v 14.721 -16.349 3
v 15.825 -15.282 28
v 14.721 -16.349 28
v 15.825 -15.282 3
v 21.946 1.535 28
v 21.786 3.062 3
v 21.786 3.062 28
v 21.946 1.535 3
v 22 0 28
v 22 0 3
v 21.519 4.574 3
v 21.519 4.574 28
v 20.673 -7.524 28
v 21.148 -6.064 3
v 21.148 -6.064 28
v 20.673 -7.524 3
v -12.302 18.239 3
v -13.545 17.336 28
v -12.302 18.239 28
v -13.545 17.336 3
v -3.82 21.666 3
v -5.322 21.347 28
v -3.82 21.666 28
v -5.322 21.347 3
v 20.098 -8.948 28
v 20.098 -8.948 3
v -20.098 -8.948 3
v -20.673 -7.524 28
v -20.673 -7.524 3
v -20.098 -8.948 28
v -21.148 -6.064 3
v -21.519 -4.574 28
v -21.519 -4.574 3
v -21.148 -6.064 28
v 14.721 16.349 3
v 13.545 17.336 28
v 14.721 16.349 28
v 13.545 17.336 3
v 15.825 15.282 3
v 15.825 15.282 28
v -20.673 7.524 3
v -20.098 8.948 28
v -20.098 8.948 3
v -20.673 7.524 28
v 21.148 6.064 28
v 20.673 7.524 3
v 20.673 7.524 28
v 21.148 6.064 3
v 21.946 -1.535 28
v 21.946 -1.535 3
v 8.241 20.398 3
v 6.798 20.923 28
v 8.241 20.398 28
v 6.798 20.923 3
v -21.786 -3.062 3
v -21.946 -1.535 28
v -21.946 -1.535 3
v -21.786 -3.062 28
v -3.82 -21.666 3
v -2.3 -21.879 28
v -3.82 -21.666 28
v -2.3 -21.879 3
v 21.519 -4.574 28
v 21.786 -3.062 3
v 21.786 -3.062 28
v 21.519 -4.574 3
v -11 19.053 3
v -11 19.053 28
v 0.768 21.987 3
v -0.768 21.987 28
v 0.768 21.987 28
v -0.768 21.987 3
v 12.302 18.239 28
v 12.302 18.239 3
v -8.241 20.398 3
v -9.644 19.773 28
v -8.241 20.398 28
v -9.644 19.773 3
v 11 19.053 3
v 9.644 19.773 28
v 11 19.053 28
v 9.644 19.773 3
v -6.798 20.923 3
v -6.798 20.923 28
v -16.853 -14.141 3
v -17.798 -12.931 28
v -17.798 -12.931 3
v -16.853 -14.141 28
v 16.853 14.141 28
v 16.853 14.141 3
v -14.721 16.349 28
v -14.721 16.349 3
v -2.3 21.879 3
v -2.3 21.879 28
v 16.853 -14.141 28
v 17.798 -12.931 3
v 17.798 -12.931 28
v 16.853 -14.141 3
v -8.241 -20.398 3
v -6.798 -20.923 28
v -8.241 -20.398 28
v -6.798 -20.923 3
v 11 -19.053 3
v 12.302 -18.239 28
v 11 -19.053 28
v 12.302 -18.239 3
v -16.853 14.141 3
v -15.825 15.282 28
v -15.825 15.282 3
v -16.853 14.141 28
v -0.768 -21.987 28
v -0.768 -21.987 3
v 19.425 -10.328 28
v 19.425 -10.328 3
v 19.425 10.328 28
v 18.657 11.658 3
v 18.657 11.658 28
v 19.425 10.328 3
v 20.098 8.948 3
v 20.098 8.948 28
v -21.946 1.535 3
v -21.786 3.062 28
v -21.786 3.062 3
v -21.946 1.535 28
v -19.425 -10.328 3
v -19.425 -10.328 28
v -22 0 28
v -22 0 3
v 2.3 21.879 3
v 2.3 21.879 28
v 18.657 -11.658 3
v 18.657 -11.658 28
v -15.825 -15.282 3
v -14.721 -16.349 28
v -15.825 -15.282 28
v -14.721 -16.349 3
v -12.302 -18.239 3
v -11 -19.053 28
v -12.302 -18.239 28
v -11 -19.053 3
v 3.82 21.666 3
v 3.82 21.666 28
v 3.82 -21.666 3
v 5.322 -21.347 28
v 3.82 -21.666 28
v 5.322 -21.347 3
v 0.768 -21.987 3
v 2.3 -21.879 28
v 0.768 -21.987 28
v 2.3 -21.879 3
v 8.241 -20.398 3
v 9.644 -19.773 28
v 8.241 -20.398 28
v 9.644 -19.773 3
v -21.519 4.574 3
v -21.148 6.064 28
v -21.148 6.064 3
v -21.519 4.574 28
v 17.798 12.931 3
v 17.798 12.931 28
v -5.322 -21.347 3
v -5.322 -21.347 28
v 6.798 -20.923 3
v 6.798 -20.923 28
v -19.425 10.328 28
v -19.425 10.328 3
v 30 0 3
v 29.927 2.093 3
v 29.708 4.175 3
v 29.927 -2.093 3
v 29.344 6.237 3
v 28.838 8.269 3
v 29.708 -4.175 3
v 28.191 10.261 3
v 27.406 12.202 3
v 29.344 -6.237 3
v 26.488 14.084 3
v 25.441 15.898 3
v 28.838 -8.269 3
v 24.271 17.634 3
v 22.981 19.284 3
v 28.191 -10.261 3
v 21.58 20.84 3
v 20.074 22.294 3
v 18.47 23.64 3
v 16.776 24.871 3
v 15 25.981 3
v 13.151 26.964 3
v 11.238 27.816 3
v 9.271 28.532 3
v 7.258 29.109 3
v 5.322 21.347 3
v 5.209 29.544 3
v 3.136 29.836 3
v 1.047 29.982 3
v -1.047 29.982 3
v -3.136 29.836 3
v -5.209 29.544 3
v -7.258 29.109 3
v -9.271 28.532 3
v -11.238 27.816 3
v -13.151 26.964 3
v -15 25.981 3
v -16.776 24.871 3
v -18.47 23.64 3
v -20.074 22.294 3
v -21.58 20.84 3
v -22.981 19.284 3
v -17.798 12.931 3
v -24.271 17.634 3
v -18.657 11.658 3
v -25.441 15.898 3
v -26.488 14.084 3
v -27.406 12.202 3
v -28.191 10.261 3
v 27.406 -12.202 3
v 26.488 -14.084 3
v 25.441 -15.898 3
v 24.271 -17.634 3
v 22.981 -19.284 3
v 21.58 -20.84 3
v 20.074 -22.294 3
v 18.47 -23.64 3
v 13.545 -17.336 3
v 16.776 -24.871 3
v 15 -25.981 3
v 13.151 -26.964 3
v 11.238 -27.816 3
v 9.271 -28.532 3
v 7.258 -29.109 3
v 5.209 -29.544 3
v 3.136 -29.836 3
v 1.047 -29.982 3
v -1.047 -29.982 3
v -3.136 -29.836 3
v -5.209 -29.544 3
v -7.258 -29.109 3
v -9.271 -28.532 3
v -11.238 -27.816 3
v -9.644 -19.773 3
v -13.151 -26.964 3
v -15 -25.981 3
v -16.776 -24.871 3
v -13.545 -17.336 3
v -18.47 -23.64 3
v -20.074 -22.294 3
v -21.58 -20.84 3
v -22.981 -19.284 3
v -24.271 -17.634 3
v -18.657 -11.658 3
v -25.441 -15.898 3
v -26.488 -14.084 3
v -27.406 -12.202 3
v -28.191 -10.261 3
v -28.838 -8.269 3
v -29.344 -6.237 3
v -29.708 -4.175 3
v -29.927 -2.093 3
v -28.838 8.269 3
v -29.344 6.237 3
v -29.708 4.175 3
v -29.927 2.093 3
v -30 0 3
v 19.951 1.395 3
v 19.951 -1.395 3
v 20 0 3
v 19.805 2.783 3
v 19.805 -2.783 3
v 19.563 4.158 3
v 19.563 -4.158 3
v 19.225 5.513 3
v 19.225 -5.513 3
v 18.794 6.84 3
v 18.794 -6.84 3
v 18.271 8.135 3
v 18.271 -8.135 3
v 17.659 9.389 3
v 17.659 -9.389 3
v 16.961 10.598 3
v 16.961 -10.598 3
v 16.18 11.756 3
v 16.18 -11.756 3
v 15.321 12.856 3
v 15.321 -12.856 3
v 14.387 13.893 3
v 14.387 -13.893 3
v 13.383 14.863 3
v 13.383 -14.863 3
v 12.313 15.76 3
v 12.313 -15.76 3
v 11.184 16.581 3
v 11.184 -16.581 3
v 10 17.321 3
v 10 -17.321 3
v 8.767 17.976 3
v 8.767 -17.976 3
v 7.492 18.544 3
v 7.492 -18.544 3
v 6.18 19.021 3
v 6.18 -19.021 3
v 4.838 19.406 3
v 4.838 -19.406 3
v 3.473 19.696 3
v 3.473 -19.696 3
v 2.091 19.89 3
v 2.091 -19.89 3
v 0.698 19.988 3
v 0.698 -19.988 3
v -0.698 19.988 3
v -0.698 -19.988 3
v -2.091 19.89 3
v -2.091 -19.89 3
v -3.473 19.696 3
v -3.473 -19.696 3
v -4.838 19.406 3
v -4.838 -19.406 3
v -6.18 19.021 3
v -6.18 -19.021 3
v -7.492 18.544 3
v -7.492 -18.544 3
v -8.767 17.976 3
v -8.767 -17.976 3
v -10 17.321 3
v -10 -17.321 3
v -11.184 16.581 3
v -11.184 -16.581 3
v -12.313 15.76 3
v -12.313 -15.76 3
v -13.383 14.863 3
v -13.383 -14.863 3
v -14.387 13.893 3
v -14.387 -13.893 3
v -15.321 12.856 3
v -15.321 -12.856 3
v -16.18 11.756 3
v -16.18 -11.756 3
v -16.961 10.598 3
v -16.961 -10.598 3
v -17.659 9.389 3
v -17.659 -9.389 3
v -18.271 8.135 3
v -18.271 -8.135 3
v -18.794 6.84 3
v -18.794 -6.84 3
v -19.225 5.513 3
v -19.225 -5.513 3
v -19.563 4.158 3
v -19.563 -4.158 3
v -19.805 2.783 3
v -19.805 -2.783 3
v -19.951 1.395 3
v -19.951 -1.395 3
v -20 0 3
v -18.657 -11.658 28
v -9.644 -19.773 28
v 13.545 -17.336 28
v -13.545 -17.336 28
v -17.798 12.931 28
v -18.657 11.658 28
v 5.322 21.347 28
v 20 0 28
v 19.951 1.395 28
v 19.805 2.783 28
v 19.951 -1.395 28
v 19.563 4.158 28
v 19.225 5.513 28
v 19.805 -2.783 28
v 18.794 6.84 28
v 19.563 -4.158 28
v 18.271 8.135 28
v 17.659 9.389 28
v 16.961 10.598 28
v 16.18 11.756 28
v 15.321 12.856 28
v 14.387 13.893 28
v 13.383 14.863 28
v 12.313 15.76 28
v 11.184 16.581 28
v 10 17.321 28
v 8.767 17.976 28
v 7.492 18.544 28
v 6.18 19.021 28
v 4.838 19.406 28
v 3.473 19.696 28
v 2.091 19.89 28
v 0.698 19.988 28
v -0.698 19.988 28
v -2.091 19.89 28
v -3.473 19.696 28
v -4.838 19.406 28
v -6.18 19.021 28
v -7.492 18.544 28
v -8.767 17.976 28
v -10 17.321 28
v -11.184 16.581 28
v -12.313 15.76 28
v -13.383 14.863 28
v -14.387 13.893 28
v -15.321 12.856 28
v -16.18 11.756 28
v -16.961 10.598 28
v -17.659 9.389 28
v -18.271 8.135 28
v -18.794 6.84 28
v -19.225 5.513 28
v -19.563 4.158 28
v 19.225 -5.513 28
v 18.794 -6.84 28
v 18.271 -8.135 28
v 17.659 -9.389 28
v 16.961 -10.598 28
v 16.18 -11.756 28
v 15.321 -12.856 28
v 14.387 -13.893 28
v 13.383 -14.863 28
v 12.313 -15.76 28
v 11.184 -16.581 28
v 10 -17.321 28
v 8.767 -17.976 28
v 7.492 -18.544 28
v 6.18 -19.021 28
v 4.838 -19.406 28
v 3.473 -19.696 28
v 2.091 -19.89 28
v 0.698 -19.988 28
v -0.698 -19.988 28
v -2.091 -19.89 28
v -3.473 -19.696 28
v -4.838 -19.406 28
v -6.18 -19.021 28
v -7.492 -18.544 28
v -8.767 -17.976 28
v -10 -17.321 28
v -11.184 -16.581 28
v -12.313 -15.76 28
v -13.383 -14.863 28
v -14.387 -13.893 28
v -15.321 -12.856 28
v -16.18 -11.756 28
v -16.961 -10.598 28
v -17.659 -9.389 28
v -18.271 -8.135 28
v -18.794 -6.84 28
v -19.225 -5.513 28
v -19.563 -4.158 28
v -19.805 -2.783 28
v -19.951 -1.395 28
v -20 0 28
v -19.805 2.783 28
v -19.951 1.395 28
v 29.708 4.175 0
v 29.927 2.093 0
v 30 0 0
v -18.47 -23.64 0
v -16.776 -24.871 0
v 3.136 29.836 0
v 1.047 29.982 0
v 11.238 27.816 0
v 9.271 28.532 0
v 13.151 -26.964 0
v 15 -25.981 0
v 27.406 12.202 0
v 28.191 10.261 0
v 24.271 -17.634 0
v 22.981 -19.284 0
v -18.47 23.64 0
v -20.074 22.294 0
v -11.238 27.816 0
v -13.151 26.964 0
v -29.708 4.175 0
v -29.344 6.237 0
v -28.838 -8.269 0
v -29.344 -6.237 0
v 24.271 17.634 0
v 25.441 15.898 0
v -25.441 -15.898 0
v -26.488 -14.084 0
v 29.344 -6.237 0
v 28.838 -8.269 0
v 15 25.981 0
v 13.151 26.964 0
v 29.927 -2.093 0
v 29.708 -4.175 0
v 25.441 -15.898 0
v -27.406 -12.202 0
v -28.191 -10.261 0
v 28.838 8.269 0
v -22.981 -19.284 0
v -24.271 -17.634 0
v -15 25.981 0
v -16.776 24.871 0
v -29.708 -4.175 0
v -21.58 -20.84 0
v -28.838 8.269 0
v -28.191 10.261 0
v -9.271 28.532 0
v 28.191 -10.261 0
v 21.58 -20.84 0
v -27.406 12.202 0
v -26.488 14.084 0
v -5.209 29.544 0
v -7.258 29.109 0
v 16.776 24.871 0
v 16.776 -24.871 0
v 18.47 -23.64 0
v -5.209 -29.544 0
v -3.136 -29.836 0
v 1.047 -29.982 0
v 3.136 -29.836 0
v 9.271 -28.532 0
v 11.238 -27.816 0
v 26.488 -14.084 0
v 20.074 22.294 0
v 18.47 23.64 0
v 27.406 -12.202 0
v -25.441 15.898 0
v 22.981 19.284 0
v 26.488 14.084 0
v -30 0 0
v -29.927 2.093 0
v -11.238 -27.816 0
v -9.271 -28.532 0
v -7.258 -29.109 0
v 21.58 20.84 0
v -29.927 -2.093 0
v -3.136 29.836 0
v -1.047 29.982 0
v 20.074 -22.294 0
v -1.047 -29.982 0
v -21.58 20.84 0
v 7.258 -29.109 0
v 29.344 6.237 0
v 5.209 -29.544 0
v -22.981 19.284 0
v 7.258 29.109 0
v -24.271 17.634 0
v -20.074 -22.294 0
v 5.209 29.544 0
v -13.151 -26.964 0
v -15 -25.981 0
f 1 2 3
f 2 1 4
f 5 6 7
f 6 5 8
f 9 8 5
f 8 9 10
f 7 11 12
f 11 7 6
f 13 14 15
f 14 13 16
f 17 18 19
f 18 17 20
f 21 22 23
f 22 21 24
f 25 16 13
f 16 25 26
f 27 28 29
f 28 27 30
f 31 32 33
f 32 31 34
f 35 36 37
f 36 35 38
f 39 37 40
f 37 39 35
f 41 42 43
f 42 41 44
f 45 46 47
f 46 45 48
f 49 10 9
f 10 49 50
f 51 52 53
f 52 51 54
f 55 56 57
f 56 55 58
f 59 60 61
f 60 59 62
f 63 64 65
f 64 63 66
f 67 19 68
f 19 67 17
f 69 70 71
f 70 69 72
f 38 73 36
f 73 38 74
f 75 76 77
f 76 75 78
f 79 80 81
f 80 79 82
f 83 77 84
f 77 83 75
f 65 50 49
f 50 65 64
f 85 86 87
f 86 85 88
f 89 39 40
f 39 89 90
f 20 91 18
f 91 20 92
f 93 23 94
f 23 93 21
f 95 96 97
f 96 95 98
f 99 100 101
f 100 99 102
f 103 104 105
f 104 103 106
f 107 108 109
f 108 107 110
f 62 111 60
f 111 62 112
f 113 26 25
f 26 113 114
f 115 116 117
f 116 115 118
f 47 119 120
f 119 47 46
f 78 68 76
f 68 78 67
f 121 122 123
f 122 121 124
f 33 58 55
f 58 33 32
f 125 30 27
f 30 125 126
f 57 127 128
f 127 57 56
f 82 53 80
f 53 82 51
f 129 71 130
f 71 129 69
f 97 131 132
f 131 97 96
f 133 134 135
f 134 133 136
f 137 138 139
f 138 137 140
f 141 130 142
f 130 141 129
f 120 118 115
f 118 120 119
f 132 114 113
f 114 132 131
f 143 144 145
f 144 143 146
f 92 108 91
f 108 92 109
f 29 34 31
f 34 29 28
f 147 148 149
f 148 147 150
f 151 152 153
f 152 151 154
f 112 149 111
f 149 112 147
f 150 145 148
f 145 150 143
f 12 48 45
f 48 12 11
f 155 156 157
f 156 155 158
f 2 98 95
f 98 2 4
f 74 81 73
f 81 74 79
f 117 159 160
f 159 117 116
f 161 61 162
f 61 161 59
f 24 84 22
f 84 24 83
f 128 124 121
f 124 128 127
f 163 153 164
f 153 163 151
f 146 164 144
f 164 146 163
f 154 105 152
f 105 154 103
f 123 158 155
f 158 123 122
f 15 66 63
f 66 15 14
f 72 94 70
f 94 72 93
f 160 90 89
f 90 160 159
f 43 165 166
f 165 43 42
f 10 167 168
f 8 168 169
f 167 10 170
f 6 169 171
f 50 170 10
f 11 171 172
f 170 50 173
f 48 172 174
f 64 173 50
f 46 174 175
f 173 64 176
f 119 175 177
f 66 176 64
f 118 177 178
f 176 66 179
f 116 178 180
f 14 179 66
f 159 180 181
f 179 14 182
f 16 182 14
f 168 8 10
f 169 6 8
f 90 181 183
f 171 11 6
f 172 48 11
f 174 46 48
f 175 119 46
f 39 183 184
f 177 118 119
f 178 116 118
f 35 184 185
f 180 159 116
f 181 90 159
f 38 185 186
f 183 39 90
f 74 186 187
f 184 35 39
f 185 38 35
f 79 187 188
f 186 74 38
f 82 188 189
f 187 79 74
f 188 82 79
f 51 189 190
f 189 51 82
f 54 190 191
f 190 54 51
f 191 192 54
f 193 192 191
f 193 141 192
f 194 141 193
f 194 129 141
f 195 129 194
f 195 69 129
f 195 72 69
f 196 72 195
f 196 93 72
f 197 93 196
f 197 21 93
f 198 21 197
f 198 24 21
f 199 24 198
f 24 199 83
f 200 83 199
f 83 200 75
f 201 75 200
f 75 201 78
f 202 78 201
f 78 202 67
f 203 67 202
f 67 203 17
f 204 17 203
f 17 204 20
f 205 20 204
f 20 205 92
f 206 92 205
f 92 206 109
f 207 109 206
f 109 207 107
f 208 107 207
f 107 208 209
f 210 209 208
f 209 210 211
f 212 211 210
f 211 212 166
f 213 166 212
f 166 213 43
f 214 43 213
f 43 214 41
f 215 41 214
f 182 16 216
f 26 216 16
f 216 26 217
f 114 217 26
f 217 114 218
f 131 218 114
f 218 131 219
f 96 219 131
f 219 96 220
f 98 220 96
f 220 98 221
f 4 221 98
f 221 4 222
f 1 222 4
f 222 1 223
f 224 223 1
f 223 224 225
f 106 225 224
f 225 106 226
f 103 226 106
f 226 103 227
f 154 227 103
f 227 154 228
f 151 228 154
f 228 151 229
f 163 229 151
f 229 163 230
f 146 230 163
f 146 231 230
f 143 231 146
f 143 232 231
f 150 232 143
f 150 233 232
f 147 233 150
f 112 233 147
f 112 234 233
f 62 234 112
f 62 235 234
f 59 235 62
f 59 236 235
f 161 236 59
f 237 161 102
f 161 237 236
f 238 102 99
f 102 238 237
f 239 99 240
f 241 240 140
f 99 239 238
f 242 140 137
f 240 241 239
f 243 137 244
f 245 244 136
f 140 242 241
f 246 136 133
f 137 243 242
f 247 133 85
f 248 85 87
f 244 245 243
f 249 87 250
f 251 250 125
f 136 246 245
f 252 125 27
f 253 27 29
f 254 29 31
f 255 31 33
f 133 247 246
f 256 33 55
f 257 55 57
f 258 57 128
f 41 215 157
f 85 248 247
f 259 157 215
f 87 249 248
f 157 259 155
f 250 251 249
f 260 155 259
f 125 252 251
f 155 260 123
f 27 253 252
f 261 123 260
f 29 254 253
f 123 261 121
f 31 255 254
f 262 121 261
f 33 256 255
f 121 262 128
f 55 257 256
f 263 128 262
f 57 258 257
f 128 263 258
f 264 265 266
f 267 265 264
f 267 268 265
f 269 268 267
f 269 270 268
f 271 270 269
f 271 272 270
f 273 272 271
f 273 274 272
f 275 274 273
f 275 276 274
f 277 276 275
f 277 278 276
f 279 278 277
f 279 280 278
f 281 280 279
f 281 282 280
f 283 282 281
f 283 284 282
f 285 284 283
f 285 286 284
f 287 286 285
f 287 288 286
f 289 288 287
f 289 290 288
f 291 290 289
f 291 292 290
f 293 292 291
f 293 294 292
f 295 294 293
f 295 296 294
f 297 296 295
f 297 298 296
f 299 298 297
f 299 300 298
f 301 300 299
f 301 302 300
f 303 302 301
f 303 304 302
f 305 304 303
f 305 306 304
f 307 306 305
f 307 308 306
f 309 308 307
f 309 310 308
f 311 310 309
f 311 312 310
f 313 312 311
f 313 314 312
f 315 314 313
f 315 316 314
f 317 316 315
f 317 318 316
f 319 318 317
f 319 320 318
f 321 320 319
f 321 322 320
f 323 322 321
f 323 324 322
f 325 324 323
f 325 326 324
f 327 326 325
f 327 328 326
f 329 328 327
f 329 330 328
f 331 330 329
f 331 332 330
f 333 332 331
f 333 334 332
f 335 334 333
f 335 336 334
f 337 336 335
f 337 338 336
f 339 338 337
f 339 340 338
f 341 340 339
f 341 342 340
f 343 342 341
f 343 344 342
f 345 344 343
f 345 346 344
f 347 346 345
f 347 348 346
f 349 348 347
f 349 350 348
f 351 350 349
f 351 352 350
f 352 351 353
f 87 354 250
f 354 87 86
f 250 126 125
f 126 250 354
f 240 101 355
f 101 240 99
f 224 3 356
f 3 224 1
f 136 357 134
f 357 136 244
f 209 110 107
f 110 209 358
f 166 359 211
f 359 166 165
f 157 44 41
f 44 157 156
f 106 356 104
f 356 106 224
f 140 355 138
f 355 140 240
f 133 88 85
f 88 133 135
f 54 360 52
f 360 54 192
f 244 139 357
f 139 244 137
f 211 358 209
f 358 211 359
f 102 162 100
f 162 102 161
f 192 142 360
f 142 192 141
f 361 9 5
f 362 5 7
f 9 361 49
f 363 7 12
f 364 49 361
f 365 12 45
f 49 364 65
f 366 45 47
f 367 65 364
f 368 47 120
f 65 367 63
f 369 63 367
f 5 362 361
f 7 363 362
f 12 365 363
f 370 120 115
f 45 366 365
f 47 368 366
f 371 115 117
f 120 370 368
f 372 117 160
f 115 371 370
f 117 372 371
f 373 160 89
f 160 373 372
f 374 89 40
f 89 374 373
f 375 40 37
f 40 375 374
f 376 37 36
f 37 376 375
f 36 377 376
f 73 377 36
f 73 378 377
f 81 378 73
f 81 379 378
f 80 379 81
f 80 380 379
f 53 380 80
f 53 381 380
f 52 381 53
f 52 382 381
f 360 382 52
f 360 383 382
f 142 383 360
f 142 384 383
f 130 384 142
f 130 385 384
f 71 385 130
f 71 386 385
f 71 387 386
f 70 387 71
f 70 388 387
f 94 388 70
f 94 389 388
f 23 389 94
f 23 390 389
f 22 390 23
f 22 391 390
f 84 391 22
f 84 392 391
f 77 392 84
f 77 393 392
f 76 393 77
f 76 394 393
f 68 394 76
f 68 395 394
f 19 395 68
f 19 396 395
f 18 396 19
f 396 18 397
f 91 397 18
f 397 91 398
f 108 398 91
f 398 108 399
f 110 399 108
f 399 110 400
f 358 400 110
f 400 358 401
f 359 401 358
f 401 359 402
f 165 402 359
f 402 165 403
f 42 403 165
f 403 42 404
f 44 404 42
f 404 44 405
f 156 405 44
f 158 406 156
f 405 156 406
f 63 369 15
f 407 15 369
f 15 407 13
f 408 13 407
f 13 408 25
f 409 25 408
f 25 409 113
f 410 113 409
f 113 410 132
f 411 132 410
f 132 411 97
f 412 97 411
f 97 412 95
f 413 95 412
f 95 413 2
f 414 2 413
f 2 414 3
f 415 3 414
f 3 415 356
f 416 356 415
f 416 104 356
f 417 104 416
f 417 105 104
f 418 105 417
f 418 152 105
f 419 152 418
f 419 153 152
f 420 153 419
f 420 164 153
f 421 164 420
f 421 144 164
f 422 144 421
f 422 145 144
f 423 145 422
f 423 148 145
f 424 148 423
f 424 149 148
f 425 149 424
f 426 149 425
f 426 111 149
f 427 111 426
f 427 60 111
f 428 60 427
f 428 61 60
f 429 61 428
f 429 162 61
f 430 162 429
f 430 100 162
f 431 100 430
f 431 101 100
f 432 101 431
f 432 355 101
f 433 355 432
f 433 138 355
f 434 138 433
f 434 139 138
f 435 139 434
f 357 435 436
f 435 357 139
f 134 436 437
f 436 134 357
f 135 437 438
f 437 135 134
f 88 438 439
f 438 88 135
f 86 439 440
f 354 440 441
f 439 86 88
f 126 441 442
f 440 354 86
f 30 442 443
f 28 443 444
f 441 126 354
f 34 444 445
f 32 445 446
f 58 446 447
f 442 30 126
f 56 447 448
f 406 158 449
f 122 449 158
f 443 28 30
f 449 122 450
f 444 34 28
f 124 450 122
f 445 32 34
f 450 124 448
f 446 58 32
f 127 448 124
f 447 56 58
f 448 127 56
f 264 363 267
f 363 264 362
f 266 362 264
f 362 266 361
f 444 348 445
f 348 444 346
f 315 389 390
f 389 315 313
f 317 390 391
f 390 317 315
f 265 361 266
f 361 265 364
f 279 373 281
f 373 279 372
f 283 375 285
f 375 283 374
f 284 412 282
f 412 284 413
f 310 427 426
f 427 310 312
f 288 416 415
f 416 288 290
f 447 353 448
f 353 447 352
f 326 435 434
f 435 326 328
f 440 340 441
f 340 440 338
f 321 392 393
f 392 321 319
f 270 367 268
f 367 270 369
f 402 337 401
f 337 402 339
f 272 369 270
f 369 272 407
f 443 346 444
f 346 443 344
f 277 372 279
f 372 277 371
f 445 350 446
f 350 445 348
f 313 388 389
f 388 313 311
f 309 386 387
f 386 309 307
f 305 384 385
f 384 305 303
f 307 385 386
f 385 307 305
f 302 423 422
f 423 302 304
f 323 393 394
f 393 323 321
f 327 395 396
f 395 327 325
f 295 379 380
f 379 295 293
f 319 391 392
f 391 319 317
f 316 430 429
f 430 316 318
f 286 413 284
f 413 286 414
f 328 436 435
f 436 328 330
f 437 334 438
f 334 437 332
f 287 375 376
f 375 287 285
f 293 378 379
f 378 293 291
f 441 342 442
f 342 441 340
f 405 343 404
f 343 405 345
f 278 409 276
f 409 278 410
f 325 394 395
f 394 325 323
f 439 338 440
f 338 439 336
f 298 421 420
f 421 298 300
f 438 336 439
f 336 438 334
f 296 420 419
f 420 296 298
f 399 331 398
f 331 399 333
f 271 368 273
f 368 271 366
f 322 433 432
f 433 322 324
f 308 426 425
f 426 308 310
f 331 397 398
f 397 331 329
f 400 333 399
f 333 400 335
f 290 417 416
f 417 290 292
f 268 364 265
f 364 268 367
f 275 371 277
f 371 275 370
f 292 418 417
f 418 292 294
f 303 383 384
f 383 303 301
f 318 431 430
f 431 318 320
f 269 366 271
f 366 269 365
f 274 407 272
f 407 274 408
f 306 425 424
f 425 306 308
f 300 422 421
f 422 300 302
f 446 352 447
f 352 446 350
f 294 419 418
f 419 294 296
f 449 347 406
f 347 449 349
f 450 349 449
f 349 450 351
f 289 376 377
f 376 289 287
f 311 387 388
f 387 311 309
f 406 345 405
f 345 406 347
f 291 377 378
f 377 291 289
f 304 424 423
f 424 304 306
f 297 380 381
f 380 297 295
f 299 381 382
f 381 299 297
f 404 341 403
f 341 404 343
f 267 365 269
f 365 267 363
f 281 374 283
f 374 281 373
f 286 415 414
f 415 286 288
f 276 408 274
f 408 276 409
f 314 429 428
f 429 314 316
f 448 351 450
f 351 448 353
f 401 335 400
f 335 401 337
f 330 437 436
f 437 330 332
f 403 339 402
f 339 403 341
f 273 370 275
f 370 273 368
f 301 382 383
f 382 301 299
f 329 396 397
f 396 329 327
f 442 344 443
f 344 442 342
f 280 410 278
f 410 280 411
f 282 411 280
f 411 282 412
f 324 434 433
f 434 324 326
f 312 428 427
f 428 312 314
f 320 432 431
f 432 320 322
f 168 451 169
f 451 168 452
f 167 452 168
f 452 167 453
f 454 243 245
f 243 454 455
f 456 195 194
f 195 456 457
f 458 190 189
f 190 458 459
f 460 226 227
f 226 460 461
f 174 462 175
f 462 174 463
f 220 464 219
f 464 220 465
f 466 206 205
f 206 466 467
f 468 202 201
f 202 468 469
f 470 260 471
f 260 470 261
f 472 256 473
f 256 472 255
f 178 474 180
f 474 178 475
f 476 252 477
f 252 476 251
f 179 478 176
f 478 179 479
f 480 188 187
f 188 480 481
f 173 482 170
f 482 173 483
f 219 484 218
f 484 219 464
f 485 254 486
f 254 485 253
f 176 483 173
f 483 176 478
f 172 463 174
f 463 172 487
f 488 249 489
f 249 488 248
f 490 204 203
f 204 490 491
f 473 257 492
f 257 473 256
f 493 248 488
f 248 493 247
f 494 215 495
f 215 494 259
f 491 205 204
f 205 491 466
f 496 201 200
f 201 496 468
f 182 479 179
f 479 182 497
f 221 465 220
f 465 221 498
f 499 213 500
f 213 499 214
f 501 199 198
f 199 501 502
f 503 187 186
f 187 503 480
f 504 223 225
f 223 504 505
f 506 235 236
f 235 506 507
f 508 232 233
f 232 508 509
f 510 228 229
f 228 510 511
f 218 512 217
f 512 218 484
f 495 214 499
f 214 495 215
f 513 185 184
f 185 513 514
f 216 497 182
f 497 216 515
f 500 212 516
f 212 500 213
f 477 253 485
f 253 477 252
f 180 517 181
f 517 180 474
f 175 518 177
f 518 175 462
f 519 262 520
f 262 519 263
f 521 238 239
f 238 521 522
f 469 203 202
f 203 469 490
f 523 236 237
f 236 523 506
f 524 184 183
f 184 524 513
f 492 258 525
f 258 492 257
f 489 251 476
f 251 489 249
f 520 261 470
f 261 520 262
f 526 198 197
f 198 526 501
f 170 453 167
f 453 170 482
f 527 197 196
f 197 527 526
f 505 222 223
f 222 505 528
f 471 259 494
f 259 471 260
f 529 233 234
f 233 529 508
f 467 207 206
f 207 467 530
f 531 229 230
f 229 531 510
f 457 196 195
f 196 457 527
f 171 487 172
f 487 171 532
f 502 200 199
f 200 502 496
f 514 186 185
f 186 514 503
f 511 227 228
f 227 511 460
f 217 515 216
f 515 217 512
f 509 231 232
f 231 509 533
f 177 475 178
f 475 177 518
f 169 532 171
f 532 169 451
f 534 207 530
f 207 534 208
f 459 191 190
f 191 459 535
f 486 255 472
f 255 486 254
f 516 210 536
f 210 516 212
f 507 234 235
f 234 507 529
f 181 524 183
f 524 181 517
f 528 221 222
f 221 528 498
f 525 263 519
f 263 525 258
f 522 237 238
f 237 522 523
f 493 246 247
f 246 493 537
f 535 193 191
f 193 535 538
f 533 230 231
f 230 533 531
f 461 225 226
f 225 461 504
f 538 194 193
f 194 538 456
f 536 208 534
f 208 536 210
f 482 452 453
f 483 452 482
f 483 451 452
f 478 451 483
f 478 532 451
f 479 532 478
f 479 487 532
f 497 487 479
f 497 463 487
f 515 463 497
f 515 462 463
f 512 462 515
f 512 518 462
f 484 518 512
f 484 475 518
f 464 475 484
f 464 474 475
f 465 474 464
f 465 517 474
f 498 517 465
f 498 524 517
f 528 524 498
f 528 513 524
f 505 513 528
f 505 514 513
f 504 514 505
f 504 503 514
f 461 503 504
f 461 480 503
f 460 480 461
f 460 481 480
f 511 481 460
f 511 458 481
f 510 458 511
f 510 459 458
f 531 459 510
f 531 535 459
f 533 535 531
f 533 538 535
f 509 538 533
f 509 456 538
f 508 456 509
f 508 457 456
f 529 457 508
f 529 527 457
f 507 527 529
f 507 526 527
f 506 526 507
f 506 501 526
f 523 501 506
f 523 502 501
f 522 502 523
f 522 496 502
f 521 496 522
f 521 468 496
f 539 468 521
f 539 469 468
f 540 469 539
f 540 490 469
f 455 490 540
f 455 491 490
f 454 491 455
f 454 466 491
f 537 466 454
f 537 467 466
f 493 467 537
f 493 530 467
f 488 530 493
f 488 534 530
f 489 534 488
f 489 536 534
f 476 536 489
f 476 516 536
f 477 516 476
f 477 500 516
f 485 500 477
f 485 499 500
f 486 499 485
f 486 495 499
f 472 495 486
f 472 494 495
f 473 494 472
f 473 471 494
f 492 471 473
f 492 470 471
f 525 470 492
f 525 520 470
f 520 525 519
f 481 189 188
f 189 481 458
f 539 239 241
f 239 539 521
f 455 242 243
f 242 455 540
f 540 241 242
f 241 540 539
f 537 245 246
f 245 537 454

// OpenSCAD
// [FL_INDEX: keywords="openscad, 3d_parametric, Simple_Plug_and_Cap_Generator, csg_solid" | COT="Parametric OpenSCAD design from 3DCodeverse"]
// Title: Simple Plug and Cap Generator

//Simple Plug or Cap

//How thick do you want the solid end portion in mm?
End_Thickness = 3;

//Diameter of the solid end portion in mm (set equal to Tube Outer Diameter for a smooth cap).
End_Diameter = 60;

//Hole diameter in mm (this dimension is critical for a cap).
Tube_Inner_Diameter = 40;

//Outer diameter of the tube portion in mm (this dimension is critical for a plug).
Tube_Outer_Diameter = 44;

//Length of the tube portion in mm (Overall Height = this dimension + End Thickness).
Tube_Height = 25; 

/* [Hidden] */
res = 90;

module plug ()
{
	union()
	{
	cylinder(h = End_Thickness, r = End_Diameter/2, center = false, $fn = res);
	
		difference()
		{
		translate ([0,0,End_Thickness]) cylinder(h = Tube_Height, r = Tube_Outer_Diameter/2, center = false, $fn = res);
		translate ([0,0,End_Thickness]) cylinder(h = Tube_Height+1, r = Tube_Inner_Diameter/2, center = false, $fn = res);
		}
	}
}
plug();
